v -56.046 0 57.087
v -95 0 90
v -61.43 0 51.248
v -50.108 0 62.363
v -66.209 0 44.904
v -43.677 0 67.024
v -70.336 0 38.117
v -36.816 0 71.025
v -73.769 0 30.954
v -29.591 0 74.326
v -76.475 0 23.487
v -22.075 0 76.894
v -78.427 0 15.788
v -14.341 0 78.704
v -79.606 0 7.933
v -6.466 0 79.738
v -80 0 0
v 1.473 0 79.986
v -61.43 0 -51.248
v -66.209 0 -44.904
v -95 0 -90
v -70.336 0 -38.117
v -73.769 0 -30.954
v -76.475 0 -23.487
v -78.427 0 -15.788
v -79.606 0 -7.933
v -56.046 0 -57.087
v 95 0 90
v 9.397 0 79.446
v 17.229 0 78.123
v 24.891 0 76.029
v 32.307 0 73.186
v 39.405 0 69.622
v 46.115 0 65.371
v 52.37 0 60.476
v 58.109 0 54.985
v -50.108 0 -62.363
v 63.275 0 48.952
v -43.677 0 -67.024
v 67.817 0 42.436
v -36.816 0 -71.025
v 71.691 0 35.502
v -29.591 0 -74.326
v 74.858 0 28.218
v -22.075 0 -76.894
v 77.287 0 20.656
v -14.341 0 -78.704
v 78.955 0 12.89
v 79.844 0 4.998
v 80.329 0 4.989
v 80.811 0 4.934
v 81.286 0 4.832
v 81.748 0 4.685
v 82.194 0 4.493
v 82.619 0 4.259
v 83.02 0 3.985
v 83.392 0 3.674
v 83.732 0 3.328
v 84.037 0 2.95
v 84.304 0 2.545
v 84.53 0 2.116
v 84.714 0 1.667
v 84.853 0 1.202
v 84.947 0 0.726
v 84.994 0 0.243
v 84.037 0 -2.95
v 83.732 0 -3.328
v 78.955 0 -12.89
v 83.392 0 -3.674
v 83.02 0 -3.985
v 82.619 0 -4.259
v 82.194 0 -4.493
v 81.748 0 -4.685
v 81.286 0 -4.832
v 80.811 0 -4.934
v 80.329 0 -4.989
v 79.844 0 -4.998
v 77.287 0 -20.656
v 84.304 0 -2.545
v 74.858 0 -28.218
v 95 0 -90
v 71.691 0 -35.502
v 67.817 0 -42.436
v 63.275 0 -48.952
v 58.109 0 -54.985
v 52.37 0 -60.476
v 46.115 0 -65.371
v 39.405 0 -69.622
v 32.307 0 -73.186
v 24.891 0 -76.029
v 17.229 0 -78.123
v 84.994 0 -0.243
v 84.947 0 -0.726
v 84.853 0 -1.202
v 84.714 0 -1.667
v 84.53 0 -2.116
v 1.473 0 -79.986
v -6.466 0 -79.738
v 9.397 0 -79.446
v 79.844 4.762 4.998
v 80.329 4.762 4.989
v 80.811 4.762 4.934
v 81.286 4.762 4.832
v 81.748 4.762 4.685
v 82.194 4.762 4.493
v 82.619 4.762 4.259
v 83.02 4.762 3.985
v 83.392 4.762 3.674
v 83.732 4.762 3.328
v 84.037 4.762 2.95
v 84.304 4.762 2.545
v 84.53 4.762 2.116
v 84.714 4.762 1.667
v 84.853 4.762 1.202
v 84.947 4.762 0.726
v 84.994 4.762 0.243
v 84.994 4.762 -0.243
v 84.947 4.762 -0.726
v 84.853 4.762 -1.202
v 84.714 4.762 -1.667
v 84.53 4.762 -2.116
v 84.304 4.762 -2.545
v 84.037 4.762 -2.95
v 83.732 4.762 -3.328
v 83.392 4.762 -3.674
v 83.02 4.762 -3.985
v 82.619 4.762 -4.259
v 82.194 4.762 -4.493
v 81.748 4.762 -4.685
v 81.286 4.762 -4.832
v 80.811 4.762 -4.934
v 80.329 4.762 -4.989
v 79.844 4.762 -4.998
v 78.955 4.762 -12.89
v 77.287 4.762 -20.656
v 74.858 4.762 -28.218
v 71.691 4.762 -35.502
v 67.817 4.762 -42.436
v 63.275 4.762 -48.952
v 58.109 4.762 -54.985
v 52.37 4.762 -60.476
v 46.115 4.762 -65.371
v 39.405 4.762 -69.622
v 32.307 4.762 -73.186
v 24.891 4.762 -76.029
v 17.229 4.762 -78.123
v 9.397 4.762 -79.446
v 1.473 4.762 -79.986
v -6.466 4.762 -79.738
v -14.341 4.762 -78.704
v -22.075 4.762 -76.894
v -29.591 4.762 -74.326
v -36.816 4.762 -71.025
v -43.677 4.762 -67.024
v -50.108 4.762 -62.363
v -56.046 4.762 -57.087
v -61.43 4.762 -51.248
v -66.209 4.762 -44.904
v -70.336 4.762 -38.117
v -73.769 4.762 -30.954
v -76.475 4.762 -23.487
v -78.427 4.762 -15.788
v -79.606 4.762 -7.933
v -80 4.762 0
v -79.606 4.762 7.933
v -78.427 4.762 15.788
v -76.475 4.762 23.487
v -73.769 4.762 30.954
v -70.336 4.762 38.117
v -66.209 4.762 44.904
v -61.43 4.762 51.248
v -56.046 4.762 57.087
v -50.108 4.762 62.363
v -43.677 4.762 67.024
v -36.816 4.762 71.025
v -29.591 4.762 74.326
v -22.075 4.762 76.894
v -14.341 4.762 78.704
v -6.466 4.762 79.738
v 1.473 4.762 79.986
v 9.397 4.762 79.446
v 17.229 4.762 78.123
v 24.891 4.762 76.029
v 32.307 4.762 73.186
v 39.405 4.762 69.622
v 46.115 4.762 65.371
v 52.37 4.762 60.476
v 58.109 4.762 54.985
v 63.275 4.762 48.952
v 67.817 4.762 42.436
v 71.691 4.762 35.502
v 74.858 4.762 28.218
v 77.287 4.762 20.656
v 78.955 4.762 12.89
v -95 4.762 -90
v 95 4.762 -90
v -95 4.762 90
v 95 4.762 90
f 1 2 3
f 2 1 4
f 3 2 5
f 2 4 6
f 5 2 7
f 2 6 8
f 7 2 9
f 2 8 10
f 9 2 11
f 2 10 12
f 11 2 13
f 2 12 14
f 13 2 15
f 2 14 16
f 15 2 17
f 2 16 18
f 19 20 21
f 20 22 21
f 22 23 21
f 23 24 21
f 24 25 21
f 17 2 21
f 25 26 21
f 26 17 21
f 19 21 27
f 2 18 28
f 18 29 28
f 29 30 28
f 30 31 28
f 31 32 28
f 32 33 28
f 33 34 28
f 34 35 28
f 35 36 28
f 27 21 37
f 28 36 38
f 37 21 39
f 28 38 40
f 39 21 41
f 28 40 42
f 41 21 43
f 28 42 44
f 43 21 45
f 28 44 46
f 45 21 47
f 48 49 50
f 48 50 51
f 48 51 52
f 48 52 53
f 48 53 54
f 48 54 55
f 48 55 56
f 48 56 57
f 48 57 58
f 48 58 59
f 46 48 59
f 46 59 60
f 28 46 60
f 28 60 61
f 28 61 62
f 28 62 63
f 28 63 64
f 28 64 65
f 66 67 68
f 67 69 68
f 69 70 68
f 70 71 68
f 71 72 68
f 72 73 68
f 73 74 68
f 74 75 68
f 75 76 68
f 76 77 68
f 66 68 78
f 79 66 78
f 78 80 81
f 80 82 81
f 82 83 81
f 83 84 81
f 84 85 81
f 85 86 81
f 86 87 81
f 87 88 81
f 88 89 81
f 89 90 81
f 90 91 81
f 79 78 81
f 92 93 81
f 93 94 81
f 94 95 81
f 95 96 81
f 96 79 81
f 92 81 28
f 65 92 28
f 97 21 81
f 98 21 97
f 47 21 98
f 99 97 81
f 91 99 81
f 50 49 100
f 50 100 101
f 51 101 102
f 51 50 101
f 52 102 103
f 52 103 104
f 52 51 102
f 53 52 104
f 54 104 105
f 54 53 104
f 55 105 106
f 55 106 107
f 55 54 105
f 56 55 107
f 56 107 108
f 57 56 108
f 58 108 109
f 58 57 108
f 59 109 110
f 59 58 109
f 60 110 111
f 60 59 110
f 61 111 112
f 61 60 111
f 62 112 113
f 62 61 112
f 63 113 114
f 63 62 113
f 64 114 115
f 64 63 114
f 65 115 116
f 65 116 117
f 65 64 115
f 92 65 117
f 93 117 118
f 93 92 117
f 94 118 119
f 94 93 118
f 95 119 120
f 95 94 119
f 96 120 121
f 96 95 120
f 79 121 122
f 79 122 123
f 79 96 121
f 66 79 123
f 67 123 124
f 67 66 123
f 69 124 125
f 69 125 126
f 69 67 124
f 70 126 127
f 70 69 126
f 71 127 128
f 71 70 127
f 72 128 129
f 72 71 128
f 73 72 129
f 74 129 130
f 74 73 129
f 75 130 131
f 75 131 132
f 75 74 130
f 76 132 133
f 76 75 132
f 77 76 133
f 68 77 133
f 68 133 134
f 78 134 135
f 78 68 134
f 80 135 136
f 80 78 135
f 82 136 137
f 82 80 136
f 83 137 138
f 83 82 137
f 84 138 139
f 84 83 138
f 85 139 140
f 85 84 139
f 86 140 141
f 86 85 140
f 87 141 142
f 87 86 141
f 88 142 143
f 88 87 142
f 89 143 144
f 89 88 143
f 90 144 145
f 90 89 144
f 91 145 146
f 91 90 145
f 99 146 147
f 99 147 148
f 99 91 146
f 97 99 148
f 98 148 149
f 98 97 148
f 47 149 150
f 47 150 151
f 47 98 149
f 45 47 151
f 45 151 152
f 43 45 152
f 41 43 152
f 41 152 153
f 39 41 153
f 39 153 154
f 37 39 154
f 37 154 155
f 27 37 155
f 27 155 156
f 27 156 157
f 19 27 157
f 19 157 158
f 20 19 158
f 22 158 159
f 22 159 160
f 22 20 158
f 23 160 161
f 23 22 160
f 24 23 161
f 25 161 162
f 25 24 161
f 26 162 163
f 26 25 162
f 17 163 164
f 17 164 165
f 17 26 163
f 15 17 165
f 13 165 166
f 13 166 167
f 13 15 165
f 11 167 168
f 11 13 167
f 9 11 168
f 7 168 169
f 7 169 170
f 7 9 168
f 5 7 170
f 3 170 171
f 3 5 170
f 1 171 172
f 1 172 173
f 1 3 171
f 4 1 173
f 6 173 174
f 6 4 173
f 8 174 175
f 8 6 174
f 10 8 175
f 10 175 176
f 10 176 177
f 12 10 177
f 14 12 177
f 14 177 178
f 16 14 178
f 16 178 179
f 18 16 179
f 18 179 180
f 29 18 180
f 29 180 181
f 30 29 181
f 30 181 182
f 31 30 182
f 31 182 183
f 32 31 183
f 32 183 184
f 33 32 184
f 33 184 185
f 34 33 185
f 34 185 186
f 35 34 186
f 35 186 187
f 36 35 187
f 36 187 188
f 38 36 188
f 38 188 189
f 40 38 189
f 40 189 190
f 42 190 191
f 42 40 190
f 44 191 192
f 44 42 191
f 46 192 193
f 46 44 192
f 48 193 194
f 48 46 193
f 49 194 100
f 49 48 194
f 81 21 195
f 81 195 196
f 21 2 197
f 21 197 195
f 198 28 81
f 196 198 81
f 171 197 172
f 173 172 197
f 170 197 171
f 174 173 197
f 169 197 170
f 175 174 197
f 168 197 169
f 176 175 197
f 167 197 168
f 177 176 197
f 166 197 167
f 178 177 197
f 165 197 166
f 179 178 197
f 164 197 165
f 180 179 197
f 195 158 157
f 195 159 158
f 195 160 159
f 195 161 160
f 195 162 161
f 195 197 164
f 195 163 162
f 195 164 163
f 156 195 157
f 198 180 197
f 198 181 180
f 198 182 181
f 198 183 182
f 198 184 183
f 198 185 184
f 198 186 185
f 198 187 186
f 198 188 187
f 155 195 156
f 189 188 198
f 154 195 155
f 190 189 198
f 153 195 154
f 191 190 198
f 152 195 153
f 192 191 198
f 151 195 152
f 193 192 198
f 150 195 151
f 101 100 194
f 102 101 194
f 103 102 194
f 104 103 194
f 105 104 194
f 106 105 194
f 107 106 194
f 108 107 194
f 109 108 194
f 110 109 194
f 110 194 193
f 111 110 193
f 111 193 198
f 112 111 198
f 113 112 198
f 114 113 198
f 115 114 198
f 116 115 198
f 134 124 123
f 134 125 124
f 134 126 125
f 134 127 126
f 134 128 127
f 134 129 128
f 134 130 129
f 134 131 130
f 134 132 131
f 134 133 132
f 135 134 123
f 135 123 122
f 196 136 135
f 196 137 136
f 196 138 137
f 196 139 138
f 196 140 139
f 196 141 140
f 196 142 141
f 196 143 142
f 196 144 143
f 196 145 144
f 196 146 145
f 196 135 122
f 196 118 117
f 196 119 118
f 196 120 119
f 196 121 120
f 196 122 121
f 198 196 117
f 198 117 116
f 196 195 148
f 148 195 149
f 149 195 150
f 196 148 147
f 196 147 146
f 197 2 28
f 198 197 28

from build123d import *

# Parameters (mm, degrees)
SKETCH1_W           = 190
SKETCH1_H           = 180
BOSS_EXTRUDE1_DEPTH = 4.7625


with BuildPart() as part:
    # Sketch1 → Boss-Extrude1 (new body)
    with BuildSketch(Plane(origin=(0, 0, 0), x_dir=(1, 0, 0), z_dir=(0, 1, 0))):
        Rectangle(SKETCH1_W, SKETCH1_H)
        with BuildLine():
            ThreePointArc((79.84375, 4.997557997), (-80, 0), (79.84375, -4.997557997))
            ThreePointArc((79.84375, -4.997557997), (85, 0), (79.84375, 4.997557997))
        make_face(mode=Mode.SUBTRACT)
    extrude(amount=BOSS_EXTRUDE1_DEPTH)


solid = part.part
